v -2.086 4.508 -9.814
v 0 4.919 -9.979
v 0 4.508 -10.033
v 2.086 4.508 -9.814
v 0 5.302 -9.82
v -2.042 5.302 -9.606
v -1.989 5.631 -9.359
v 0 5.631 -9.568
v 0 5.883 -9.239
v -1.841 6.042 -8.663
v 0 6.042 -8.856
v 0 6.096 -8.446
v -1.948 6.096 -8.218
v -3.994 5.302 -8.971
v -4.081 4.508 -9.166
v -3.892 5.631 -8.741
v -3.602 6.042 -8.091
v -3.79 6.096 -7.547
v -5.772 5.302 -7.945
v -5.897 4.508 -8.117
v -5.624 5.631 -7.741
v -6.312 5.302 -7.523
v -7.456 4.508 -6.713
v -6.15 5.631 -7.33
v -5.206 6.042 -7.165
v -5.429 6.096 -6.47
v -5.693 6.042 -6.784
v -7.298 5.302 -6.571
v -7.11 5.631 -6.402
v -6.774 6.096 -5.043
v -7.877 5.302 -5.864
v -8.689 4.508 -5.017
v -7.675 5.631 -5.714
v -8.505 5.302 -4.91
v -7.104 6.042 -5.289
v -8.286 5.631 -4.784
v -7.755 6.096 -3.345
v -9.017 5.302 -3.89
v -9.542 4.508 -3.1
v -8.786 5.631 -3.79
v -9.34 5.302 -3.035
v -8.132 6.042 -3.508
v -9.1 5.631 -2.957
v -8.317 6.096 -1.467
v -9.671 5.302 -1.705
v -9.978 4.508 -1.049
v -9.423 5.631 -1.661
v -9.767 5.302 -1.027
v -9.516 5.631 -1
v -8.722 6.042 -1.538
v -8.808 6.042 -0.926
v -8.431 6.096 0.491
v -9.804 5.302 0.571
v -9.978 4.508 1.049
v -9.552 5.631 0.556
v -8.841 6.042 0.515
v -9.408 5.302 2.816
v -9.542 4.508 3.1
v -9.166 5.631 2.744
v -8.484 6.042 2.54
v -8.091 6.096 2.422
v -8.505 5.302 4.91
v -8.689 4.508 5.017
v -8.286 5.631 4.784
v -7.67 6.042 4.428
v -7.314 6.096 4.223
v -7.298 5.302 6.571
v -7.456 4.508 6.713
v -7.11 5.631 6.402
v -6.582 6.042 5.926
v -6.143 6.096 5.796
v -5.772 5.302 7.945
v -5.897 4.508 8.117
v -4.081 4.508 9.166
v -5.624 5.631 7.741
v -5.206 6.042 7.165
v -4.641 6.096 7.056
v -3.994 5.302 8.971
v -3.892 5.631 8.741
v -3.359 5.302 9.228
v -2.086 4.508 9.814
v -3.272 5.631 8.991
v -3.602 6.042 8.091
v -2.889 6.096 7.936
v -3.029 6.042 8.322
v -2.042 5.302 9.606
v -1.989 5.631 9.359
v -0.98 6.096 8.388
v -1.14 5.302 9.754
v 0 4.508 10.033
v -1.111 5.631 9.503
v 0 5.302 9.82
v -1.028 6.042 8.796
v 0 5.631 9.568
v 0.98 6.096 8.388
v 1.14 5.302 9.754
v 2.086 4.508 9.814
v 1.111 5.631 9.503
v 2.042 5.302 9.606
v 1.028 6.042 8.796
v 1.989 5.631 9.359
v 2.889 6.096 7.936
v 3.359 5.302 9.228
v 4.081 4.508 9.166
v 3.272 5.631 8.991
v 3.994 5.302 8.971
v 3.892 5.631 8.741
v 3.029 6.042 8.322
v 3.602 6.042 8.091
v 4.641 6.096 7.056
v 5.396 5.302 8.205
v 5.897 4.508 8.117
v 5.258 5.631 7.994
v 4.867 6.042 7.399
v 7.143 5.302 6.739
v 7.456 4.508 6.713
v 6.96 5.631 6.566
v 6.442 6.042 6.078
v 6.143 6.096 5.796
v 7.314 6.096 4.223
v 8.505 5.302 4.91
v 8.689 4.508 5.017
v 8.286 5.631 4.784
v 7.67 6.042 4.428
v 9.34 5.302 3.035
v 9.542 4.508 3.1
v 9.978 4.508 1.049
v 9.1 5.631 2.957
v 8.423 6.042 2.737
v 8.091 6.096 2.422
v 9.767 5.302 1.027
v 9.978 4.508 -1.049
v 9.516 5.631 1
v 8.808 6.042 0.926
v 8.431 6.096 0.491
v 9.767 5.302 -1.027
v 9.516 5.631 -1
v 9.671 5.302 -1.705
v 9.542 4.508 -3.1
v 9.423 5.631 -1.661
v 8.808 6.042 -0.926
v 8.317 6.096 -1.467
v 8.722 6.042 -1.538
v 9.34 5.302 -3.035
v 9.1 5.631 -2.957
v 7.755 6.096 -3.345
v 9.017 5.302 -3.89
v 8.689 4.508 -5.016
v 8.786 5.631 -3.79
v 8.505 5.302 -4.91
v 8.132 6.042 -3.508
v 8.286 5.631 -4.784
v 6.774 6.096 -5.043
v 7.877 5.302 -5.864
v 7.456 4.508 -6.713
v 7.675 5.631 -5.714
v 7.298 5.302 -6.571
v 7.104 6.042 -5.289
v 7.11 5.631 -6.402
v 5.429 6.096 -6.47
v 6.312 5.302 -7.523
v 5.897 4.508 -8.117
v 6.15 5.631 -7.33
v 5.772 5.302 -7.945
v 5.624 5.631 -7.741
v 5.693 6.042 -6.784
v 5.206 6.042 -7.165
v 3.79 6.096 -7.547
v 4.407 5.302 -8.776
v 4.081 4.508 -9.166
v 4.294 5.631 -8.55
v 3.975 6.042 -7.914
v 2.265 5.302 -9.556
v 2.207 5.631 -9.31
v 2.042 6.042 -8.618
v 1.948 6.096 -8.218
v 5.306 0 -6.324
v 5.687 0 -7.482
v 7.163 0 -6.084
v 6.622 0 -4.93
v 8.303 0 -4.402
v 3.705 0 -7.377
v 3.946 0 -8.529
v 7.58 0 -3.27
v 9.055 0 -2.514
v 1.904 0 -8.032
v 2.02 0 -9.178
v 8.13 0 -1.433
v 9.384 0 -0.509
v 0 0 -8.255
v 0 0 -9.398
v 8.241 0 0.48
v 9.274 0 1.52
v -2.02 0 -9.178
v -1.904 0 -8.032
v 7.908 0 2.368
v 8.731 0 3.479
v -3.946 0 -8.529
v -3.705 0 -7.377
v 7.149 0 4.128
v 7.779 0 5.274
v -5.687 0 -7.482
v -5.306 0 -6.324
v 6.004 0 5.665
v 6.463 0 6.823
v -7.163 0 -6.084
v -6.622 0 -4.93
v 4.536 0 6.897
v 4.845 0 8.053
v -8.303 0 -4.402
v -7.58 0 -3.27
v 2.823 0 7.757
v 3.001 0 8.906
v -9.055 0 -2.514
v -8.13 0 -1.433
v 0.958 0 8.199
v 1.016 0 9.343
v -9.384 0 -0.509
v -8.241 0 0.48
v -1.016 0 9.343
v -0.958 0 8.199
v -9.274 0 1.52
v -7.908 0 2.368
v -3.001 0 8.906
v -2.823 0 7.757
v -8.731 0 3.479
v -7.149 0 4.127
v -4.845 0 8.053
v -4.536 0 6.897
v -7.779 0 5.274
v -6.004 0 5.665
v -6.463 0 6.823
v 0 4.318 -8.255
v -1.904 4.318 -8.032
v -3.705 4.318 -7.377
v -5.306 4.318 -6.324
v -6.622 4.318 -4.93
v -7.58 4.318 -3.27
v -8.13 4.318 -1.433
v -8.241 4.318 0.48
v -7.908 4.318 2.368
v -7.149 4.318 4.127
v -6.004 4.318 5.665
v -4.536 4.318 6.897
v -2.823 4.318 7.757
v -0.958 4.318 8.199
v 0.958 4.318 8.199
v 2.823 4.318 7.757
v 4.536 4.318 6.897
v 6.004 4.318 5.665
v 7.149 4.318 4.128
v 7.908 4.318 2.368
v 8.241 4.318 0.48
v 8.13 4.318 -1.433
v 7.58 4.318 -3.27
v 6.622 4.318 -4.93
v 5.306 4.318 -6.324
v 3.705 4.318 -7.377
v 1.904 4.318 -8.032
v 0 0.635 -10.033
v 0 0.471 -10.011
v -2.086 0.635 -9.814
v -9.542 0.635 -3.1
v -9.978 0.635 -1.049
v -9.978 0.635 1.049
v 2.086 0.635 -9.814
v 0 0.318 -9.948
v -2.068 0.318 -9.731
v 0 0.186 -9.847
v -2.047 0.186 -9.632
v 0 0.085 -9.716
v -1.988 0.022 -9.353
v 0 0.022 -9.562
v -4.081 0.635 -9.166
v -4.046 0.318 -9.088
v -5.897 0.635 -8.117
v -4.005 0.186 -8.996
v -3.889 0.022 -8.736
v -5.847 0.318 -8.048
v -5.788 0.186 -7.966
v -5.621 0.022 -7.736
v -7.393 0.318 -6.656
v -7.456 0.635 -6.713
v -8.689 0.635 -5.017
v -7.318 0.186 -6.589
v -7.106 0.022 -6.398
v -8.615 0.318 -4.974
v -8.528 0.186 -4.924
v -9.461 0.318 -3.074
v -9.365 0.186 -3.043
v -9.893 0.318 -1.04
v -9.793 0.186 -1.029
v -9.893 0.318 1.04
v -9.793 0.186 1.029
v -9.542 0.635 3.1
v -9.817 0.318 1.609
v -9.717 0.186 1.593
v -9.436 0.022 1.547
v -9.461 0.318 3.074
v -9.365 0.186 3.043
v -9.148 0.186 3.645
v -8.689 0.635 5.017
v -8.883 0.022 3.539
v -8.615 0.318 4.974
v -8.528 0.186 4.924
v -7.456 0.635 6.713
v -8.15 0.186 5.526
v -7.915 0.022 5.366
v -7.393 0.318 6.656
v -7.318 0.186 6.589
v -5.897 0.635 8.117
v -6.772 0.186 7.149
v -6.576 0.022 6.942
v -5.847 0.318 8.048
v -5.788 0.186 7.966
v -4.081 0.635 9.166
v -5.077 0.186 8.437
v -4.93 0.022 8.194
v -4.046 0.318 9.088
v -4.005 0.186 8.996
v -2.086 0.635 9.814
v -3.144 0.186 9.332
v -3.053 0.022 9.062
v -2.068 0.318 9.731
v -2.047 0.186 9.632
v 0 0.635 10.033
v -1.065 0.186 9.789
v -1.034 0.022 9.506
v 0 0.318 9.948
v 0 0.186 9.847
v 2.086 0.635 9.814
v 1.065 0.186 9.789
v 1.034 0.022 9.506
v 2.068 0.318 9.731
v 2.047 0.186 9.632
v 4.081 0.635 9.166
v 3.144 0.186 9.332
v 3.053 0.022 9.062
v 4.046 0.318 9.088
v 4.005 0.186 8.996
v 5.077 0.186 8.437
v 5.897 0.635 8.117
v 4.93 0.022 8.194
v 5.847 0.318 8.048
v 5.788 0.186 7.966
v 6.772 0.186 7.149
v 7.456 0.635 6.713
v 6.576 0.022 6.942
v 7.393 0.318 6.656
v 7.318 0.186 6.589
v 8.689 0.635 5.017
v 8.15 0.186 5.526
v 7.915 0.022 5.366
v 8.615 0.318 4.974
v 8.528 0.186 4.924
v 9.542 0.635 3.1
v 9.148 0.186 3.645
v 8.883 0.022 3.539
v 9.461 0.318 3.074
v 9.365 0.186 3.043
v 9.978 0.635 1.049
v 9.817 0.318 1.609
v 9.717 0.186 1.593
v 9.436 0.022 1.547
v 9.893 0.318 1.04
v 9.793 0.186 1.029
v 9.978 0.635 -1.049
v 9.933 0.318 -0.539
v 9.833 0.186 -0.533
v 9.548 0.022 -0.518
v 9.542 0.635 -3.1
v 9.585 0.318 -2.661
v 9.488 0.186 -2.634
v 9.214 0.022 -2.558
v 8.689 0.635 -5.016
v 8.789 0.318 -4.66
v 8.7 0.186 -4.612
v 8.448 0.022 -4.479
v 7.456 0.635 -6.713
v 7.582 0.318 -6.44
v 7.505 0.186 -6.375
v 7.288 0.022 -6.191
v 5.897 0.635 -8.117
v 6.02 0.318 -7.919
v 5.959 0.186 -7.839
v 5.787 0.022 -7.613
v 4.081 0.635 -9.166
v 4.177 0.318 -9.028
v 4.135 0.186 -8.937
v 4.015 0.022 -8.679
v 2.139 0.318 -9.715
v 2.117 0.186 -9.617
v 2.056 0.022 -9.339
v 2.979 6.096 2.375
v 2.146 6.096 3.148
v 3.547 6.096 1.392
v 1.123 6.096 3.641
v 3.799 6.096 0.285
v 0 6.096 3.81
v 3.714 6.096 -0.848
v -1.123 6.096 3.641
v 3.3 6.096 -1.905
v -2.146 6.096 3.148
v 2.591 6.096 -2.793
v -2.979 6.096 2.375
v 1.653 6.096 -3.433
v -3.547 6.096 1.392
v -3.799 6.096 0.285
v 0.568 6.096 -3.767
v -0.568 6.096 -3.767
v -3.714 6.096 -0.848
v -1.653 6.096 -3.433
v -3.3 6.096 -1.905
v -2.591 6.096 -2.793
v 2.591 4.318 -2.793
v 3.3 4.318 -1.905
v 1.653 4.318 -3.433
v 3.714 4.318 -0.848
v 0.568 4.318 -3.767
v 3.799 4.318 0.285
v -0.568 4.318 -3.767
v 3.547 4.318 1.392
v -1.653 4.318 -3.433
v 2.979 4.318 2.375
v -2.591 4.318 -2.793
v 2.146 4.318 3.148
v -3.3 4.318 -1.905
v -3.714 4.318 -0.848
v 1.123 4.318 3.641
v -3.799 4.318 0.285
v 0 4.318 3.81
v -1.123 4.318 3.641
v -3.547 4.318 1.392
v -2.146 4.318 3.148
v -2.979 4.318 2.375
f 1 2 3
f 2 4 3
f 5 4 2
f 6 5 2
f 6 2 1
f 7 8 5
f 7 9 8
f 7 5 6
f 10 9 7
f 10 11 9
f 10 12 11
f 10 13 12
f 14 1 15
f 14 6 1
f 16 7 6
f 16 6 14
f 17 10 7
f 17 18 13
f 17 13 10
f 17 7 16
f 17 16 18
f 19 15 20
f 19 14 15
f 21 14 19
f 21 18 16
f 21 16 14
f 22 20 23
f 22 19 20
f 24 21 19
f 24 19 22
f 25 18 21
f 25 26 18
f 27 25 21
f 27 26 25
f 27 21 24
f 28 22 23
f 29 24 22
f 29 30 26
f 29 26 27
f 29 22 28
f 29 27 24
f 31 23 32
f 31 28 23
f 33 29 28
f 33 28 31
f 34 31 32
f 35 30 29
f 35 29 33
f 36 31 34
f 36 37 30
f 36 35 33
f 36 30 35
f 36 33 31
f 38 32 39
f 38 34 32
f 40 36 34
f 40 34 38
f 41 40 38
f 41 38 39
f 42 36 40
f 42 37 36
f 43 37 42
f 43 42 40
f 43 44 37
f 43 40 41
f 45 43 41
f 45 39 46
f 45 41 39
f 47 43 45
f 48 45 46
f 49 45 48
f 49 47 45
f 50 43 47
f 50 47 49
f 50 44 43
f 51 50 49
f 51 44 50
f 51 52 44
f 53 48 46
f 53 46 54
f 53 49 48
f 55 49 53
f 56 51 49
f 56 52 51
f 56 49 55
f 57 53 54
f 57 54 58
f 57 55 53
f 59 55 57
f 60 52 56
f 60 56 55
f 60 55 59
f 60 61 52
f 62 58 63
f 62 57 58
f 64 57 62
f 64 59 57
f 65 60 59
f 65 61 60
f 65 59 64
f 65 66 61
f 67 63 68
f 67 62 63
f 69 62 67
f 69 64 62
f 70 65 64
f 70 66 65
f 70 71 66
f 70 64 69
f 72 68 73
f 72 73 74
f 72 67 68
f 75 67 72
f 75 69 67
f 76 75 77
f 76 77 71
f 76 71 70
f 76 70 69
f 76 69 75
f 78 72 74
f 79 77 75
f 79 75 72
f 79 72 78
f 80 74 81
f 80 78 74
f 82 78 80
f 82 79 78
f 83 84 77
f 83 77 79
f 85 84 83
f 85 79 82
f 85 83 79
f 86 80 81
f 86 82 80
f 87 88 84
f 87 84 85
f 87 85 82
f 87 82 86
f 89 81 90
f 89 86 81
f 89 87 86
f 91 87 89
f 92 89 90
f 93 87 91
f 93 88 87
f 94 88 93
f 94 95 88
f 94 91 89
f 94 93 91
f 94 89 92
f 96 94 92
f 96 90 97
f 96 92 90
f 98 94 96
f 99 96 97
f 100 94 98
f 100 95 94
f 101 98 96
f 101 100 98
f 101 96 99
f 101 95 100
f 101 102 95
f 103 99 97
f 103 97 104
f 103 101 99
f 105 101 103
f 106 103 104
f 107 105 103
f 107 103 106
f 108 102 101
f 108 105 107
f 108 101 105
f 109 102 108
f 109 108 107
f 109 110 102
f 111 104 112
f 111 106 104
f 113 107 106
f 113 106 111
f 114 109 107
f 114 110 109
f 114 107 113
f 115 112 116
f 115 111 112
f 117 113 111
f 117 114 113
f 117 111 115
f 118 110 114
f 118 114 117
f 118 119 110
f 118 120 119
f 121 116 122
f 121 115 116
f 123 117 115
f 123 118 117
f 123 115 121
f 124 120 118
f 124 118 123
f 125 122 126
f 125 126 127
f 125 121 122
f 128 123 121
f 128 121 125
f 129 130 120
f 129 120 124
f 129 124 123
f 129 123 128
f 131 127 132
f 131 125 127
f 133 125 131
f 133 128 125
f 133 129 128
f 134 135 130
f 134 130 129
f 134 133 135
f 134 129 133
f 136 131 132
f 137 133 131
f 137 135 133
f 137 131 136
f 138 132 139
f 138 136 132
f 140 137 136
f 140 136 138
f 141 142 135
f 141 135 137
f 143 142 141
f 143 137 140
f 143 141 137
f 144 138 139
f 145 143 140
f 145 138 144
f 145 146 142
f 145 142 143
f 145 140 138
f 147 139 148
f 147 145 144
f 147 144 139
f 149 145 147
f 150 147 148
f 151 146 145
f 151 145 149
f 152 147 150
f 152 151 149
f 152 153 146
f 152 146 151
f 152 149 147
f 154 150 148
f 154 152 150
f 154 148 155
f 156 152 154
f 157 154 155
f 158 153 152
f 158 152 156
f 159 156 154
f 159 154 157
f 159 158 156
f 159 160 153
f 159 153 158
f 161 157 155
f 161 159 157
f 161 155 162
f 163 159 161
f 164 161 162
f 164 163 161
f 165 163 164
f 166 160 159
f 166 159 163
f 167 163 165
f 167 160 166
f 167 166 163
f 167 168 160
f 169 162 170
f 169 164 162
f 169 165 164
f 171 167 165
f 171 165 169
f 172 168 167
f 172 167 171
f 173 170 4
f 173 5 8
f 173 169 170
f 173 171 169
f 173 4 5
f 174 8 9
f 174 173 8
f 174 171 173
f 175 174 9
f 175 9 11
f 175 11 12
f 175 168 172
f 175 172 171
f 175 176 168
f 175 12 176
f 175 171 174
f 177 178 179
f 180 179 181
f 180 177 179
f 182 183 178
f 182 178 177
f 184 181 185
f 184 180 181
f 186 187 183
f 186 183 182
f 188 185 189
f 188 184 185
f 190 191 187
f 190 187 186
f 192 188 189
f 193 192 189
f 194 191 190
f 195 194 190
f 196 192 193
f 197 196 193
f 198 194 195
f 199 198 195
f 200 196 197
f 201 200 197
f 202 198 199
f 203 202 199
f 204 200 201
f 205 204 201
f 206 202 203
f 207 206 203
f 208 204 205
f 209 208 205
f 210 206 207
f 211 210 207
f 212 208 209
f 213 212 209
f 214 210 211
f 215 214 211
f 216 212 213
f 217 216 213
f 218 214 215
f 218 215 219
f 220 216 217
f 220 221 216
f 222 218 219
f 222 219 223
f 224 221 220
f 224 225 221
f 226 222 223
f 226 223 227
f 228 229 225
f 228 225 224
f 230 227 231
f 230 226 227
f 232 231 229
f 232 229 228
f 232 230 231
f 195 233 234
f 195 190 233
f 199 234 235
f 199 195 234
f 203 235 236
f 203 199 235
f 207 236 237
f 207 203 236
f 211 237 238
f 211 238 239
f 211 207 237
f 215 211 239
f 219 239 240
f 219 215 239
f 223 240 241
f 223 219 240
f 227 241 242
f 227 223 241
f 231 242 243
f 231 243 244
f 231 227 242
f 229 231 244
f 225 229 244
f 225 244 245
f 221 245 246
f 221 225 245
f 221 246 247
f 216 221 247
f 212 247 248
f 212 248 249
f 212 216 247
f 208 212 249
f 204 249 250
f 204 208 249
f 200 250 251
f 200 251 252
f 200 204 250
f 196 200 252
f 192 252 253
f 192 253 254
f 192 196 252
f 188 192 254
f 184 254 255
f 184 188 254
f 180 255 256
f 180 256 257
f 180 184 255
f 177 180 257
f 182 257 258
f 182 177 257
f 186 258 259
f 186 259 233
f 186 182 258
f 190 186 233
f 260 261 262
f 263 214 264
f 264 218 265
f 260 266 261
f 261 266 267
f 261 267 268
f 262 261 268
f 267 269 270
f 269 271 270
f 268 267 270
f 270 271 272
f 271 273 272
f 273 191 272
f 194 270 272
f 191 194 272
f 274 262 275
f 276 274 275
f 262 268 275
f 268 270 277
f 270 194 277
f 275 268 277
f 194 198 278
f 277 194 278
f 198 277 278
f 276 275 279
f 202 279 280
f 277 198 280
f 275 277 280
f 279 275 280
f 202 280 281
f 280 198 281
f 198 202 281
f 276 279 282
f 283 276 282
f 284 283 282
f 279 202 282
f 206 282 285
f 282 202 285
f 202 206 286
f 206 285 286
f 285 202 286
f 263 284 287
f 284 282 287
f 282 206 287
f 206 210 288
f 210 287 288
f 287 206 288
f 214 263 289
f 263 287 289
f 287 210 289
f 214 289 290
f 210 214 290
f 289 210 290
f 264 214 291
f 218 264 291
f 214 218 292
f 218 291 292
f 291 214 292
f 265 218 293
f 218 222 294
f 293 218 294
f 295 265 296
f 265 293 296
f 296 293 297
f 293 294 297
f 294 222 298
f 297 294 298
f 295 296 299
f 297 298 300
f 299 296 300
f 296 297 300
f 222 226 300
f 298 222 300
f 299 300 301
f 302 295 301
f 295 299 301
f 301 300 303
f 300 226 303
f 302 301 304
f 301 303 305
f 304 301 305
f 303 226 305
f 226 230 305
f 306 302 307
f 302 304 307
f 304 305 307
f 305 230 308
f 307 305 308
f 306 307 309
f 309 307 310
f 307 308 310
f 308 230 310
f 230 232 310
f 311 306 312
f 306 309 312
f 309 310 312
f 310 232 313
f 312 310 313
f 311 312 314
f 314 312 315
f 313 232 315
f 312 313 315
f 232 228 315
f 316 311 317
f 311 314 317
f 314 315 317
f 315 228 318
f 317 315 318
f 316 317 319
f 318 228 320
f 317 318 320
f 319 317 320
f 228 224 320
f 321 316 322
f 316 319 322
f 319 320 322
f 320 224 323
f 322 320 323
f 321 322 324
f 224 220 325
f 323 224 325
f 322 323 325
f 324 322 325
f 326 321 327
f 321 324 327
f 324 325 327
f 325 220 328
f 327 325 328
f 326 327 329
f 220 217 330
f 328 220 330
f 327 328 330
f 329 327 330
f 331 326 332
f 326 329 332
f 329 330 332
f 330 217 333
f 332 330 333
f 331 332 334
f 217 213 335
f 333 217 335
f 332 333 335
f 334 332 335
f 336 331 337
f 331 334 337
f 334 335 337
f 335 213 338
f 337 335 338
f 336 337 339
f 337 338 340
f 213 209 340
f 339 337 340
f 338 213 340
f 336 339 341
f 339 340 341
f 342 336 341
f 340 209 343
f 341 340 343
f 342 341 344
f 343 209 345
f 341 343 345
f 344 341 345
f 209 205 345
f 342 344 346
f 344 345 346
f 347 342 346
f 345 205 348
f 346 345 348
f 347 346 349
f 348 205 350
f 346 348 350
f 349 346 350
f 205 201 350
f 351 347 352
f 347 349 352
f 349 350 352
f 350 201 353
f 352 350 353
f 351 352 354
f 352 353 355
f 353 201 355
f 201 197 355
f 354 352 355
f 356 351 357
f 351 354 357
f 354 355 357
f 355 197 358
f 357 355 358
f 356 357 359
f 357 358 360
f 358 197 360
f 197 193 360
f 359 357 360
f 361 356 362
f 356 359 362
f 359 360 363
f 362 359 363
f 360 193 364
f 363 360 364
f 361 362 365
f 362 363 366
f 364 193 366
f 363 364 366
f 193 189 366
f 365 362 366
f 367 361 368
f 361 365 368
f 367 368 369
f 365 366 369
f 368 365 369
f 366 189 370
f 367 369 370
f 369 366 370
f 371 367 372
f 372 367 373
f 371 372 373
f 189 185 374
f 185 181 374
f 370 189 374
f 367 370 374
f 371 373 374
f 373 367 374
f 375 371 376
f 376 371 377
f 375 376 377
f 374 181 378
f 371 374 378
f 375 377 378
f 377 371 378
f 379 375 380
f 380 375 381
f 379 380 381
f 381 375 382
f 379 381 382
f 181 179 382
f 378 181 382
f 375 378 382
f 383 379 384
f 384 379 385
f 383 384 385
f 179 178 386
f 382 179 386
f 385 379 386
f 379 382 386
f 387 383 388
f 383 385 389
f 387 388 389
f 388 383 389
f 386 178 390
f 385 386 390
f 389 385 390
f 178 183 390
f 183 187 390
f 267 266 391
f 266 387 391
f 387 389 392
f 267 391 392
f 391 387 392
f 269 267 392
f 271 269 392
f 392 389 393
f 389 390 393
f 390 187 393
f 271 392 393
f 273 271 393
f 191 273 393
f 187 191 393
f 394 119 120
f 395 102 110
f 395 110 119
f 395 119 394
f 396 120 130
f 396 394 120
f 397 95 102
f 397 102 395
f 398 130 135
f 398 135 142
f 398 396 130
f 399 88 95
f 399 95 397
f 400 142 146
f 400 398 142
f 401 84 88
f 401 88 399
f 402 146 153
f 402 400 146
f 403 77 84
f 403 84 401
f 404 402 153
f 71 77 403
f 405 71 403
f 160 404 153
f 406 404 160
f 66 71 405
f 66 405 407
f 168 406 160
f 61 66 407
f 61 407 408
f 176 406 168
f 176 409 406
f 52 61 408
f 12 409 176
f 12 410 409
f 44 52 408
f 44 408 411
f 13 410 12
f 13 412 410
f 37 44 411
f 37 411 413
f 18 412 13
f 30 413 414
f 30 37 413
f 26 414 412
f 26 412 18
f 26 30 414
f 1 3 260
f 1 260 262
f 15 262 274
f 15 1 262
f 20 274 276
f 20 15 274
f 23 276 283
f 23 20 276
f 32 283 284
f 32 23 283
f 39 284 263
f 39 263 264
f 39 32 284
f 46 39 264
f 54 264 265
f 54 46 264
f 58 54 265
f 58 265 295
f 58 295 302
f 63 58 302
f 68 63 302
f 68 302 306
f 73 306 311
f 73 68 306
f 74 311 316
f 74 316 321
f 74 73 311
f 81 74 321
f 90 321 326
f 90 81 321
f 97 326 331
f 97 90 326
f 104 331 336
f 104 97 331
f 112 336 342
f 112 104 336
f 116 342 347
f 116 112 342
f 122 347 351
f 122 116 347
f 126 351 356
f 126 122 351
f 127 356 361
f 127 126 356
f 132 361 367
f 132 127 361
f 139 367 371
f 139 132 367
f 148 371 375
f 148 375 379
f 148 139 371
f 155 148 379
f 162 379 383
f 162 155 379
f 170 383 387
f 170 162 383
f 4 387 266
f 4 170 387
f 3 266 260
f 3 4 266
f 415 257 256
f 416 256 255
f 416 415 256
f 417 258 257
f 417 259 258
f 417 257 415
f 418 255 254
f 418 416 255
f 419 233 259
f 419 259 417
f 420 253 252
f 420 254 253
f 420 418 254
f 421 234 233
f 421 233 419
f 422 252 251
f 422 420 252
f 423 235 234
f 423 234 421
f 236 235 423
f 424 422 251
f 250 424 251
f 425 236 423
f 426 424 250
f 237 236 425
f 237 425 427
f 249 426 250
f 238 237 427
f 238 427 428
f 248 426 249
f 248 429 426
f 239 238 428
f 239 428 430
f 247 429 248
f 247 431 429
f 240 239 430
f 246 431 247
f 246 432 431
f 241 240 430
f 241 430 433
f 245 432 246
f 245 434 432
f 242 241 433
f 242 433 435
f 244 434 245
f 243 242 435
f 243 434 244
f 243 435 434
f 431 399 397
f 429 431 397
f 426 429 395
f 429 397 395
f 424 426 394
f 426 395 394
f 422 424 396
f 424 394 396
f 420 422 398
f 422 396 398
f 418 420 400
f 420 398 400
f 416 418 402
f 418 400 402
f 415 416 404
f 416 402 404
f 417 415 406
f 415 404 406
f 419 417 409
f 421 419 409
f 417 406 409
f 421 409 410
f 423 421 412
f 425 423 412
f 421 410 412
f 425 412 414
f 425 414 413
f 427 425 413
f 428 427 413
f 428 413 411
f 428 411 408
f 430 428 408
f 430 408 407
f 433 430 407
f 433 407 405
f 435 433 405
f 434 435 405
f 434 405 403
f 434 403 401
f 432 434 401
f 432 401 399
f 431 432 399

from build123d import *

# Parameters (mm, degrees)
FILLET1_R          = 1.5875
SKETCH2_R          = 3.81
CUT_EXTRUDE1_DEPTH = 16.442907563
FILLET2_R          = 0.635


with BuildPart() as part:
    # Sketch1 → Base-Revolve (revolve)
    with BuildSketch(Plane.XY, mode=Mode.PRIVATE) as base_revolve_sk:
        Polygon((-8.255, 0), (-10.033, 0), (-10.033, 6.096), (0, 6.096), (0, 4.318), (-8.255, 4.318), align=None)
    revolve(base_revolve_sk.sketch.rotate(Axis((0, 0, 0), (0, 1, 0)), 270), axis=Axis((0, 0, 0), (0, 1, 0)))

    # Fillet1
    fillet1_edges = [part.edges().sort_by_distance(p)[0] for p in [
        (0, 6.096, 10.033),
    ]]
    fillet(fillet1_edges, radius=FILLET1_R)

    # Sketch2 → Cut-Extrude1 (cut, through all)
    with BuildSketch(Plane(origin=(0, 6.096, 0), x_dir=(-1, 0, 0), z_dir=(0, 1, 0))):
        with Locations(Location((0, 0, 0), (0, 0, 90))):
            Circle(SKETCH2_R)
    extrude(amount=-CUT_EXTRUDE1_DEPTH, mode=Mode.SUBTRACT)

    # Fillet2
    fillet2_edges = [part.edges().sort_by_distance(p)[0] for p in [
        (0, 0, 10.033),
    ]]
    fillet(fillet2_edges, radius=FILLET2_R)


solid = part.part
